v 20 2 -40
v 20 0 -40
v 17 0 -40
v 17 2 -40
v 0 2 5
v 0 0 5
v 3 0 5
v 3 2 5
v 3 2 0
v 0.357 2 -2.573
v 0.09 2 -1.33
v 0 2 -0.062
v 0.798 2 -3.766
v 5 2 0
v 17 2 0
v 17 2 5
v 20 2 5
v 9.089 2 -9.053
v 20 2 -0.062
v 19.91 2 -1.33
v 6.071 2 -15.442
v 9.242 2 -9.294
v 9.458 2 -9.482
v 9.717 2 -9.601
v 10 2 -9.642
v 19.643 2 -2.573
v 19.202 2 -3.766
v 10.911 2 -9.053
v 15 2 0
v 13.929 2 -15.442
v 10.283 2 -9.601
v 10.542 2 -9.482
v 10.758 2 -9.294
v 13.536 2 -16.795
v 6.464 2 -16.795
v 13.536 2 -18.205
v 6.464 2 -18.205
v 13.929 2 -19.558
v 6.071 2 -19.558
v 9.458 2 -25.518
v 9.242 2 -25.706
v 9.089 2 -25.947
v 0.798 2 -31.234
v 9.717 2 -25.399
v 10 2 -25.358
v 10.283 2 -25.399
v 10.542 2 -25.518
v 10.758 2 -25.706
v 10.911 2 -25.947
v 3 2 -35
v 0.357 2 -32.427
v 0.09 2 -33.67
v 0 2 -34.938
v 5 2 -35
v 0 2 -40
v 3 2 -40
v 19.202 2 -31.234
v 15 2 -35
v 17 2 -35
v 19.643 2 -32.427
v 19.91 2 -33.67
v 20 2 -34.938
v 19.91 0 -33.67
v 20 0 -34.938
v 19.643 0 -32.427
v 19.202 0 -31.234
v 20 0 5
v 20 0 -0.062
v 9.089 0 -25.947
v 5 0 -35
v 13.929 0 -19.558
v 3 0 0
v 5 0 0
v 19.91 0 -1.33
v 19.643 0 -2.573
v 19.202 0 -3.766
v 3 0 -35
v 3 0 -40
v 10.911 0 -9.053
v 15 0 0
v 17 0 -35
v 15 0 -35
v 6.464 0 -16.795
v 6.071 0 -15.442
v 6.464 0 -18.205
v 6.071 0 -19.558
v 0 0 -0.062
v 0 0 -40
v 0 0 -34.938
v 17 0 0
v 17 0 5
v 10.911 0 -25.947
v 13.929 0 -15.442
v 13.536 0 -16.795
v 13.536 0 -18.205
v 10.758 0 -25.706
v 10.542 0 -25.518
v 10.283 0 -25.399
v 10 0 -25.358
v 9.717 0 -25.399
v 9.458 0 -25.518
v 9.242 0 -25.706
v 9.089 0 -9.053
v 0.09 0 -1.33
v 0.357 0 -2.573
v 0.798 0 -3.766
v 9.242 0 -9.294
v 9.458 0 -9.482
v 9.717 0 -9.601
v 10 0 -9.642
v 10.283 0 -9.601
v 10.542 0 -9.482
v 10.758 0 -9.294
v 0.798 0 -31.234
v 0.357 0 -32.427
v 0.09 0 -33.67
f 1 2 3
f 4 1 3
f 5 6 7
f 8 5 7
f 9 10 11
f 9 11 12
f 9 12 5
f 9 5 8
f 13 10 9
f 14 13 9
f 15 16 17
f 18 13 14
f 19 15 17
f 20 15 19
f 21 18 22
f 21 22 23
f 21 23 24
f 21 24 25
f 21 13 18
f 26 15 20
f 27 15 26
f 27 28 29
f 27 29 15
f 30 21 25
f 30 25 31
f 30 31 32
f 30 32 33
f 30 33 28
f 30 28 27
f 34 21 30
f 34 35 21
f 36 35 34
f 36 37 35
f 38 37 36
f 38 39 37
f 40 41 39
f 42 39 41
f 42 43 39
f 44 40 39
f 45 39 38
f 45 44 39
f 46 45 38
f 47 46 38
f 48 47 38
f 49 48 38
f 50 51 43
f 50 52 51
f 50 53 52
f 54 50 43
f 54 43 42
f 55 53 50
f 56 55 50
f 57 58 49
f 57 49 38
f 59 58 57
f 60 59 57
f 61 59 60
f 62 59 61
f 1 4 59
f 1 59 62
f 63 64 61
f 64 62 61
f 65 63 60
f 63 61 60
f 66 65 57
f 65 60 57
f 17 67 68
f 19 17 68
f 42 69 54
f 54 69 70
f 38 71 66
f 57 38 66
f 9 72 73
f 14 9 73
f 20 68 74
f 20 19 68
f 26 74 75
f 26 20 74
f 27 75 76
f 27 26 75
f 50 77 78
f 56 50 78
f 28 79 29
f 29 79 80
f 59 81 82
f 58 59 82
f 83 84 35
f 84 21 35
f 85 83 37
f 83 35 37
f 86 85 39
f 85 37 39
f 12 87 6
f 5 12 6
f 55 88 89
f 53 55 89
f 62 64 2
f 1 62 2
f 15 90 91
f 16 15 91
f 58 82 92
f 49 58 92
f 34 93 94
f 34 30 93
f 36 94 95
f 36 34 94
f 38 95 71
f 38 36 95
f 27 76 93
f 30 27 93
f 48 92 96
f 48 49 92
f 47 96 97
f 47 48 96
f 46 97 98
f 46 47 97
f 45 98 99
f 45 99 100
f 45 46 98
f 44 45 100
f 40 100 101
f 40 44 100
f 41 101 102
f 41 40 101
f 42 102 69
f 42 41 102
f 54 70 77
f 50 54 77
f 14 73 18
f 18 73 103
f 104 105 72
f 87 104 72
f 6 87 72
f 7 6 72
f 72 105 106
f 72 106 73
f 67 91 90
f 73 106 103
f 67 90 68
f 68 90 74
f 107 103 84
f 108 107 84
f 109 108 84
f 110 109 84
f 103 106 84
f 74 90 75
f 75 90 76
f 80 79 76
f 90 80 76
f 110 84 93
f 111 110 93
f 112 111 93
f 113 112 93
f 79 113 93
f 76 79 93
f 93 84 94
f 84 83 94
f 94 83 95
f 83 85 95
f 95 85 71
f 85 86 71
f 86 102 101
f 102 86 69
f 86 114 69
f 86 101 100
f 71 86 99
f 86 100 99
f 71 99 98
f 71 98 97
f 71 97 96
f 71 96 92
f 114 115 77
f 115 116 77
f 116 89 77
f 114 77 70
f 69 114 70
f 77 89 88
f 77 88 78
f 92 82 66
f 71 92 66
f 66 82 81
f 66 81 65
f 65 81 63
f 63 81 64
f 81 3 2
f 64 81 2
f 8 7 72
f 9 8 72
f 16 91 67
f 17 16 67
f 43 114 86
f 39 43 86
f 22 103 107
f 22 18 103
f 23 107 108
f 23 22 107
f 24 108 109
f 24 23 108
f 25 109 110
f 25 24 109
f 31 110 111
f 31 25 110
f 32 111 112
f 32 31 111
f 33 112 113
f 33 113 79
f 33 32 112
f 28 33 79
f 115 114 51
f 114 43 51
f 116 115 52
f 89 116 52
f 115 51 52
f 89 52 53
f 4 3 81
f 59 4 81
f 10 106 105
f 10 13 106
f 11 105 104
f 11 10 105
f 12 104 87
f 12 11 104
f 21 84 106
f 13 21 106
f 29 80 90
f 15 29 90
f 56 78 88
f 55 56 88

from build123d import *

# Parameters (mm, degrees)
BOSS_EXTRUDE1_DEPTH = 2
FILLET1_R           = 1
FILLET2_R           = 5
FILLET3_R           = 9


with BuildPart() as part:
    # Sketch1 → Boss-Extrude1 (new body)
    with BuildSketch(Plane(origin=(0, 0, 0), x_dir=(1, 0, 0), z_dir=(0, 1, 0))):
        Polygon((3, 0), (5, 0), (10, 11.071428571), (15, 0), (17, 0), (17, -5), (20, -5), (20, 0), (20, 2), (13, 17.5), (20, 33), (20, 35), (20, 40), (17, 40), (17, 35), (15, 35), (10, 23.928571429), (5, 35), (3, 35), (3, 40), (0, 40), (0, 35), (0, 33), (7, 17.5), (0, 2), (0, 0), (0, -5), (3, -5), align=None)
    extrude(amount=BOSS_EXTRUDE1_DEPTH)

    # Fillet1
    fillet1_edges = [part.edges().sort_by_distance(p)[0] for p in [
        (10, 1, -23.928571429),
        (10, 1, -11.071428571),
    ]]
    fillet(fillet1_edges, radius=FILLET1_R)

    # Fillet2
    fillet2_edges = [part.edges().sort_by_distance(p)[0] for p in [
        (7, 1, -17.5),
        (13, 1, -17.5),
    ]]
    fillet(fillet2_edges, radius=FILLET2_R)

    # Fillet3
    fillet3_edges = [part.edges().sort_by_distance(p)[0] for p in [
        (0, 1, -2),
        (0, 1, -33),
        (20, 1, -33),
        (20, 1, -2),
    ]]
    fillet(fillet3_edges, radius=FILLET3_R)


solid = part.part
